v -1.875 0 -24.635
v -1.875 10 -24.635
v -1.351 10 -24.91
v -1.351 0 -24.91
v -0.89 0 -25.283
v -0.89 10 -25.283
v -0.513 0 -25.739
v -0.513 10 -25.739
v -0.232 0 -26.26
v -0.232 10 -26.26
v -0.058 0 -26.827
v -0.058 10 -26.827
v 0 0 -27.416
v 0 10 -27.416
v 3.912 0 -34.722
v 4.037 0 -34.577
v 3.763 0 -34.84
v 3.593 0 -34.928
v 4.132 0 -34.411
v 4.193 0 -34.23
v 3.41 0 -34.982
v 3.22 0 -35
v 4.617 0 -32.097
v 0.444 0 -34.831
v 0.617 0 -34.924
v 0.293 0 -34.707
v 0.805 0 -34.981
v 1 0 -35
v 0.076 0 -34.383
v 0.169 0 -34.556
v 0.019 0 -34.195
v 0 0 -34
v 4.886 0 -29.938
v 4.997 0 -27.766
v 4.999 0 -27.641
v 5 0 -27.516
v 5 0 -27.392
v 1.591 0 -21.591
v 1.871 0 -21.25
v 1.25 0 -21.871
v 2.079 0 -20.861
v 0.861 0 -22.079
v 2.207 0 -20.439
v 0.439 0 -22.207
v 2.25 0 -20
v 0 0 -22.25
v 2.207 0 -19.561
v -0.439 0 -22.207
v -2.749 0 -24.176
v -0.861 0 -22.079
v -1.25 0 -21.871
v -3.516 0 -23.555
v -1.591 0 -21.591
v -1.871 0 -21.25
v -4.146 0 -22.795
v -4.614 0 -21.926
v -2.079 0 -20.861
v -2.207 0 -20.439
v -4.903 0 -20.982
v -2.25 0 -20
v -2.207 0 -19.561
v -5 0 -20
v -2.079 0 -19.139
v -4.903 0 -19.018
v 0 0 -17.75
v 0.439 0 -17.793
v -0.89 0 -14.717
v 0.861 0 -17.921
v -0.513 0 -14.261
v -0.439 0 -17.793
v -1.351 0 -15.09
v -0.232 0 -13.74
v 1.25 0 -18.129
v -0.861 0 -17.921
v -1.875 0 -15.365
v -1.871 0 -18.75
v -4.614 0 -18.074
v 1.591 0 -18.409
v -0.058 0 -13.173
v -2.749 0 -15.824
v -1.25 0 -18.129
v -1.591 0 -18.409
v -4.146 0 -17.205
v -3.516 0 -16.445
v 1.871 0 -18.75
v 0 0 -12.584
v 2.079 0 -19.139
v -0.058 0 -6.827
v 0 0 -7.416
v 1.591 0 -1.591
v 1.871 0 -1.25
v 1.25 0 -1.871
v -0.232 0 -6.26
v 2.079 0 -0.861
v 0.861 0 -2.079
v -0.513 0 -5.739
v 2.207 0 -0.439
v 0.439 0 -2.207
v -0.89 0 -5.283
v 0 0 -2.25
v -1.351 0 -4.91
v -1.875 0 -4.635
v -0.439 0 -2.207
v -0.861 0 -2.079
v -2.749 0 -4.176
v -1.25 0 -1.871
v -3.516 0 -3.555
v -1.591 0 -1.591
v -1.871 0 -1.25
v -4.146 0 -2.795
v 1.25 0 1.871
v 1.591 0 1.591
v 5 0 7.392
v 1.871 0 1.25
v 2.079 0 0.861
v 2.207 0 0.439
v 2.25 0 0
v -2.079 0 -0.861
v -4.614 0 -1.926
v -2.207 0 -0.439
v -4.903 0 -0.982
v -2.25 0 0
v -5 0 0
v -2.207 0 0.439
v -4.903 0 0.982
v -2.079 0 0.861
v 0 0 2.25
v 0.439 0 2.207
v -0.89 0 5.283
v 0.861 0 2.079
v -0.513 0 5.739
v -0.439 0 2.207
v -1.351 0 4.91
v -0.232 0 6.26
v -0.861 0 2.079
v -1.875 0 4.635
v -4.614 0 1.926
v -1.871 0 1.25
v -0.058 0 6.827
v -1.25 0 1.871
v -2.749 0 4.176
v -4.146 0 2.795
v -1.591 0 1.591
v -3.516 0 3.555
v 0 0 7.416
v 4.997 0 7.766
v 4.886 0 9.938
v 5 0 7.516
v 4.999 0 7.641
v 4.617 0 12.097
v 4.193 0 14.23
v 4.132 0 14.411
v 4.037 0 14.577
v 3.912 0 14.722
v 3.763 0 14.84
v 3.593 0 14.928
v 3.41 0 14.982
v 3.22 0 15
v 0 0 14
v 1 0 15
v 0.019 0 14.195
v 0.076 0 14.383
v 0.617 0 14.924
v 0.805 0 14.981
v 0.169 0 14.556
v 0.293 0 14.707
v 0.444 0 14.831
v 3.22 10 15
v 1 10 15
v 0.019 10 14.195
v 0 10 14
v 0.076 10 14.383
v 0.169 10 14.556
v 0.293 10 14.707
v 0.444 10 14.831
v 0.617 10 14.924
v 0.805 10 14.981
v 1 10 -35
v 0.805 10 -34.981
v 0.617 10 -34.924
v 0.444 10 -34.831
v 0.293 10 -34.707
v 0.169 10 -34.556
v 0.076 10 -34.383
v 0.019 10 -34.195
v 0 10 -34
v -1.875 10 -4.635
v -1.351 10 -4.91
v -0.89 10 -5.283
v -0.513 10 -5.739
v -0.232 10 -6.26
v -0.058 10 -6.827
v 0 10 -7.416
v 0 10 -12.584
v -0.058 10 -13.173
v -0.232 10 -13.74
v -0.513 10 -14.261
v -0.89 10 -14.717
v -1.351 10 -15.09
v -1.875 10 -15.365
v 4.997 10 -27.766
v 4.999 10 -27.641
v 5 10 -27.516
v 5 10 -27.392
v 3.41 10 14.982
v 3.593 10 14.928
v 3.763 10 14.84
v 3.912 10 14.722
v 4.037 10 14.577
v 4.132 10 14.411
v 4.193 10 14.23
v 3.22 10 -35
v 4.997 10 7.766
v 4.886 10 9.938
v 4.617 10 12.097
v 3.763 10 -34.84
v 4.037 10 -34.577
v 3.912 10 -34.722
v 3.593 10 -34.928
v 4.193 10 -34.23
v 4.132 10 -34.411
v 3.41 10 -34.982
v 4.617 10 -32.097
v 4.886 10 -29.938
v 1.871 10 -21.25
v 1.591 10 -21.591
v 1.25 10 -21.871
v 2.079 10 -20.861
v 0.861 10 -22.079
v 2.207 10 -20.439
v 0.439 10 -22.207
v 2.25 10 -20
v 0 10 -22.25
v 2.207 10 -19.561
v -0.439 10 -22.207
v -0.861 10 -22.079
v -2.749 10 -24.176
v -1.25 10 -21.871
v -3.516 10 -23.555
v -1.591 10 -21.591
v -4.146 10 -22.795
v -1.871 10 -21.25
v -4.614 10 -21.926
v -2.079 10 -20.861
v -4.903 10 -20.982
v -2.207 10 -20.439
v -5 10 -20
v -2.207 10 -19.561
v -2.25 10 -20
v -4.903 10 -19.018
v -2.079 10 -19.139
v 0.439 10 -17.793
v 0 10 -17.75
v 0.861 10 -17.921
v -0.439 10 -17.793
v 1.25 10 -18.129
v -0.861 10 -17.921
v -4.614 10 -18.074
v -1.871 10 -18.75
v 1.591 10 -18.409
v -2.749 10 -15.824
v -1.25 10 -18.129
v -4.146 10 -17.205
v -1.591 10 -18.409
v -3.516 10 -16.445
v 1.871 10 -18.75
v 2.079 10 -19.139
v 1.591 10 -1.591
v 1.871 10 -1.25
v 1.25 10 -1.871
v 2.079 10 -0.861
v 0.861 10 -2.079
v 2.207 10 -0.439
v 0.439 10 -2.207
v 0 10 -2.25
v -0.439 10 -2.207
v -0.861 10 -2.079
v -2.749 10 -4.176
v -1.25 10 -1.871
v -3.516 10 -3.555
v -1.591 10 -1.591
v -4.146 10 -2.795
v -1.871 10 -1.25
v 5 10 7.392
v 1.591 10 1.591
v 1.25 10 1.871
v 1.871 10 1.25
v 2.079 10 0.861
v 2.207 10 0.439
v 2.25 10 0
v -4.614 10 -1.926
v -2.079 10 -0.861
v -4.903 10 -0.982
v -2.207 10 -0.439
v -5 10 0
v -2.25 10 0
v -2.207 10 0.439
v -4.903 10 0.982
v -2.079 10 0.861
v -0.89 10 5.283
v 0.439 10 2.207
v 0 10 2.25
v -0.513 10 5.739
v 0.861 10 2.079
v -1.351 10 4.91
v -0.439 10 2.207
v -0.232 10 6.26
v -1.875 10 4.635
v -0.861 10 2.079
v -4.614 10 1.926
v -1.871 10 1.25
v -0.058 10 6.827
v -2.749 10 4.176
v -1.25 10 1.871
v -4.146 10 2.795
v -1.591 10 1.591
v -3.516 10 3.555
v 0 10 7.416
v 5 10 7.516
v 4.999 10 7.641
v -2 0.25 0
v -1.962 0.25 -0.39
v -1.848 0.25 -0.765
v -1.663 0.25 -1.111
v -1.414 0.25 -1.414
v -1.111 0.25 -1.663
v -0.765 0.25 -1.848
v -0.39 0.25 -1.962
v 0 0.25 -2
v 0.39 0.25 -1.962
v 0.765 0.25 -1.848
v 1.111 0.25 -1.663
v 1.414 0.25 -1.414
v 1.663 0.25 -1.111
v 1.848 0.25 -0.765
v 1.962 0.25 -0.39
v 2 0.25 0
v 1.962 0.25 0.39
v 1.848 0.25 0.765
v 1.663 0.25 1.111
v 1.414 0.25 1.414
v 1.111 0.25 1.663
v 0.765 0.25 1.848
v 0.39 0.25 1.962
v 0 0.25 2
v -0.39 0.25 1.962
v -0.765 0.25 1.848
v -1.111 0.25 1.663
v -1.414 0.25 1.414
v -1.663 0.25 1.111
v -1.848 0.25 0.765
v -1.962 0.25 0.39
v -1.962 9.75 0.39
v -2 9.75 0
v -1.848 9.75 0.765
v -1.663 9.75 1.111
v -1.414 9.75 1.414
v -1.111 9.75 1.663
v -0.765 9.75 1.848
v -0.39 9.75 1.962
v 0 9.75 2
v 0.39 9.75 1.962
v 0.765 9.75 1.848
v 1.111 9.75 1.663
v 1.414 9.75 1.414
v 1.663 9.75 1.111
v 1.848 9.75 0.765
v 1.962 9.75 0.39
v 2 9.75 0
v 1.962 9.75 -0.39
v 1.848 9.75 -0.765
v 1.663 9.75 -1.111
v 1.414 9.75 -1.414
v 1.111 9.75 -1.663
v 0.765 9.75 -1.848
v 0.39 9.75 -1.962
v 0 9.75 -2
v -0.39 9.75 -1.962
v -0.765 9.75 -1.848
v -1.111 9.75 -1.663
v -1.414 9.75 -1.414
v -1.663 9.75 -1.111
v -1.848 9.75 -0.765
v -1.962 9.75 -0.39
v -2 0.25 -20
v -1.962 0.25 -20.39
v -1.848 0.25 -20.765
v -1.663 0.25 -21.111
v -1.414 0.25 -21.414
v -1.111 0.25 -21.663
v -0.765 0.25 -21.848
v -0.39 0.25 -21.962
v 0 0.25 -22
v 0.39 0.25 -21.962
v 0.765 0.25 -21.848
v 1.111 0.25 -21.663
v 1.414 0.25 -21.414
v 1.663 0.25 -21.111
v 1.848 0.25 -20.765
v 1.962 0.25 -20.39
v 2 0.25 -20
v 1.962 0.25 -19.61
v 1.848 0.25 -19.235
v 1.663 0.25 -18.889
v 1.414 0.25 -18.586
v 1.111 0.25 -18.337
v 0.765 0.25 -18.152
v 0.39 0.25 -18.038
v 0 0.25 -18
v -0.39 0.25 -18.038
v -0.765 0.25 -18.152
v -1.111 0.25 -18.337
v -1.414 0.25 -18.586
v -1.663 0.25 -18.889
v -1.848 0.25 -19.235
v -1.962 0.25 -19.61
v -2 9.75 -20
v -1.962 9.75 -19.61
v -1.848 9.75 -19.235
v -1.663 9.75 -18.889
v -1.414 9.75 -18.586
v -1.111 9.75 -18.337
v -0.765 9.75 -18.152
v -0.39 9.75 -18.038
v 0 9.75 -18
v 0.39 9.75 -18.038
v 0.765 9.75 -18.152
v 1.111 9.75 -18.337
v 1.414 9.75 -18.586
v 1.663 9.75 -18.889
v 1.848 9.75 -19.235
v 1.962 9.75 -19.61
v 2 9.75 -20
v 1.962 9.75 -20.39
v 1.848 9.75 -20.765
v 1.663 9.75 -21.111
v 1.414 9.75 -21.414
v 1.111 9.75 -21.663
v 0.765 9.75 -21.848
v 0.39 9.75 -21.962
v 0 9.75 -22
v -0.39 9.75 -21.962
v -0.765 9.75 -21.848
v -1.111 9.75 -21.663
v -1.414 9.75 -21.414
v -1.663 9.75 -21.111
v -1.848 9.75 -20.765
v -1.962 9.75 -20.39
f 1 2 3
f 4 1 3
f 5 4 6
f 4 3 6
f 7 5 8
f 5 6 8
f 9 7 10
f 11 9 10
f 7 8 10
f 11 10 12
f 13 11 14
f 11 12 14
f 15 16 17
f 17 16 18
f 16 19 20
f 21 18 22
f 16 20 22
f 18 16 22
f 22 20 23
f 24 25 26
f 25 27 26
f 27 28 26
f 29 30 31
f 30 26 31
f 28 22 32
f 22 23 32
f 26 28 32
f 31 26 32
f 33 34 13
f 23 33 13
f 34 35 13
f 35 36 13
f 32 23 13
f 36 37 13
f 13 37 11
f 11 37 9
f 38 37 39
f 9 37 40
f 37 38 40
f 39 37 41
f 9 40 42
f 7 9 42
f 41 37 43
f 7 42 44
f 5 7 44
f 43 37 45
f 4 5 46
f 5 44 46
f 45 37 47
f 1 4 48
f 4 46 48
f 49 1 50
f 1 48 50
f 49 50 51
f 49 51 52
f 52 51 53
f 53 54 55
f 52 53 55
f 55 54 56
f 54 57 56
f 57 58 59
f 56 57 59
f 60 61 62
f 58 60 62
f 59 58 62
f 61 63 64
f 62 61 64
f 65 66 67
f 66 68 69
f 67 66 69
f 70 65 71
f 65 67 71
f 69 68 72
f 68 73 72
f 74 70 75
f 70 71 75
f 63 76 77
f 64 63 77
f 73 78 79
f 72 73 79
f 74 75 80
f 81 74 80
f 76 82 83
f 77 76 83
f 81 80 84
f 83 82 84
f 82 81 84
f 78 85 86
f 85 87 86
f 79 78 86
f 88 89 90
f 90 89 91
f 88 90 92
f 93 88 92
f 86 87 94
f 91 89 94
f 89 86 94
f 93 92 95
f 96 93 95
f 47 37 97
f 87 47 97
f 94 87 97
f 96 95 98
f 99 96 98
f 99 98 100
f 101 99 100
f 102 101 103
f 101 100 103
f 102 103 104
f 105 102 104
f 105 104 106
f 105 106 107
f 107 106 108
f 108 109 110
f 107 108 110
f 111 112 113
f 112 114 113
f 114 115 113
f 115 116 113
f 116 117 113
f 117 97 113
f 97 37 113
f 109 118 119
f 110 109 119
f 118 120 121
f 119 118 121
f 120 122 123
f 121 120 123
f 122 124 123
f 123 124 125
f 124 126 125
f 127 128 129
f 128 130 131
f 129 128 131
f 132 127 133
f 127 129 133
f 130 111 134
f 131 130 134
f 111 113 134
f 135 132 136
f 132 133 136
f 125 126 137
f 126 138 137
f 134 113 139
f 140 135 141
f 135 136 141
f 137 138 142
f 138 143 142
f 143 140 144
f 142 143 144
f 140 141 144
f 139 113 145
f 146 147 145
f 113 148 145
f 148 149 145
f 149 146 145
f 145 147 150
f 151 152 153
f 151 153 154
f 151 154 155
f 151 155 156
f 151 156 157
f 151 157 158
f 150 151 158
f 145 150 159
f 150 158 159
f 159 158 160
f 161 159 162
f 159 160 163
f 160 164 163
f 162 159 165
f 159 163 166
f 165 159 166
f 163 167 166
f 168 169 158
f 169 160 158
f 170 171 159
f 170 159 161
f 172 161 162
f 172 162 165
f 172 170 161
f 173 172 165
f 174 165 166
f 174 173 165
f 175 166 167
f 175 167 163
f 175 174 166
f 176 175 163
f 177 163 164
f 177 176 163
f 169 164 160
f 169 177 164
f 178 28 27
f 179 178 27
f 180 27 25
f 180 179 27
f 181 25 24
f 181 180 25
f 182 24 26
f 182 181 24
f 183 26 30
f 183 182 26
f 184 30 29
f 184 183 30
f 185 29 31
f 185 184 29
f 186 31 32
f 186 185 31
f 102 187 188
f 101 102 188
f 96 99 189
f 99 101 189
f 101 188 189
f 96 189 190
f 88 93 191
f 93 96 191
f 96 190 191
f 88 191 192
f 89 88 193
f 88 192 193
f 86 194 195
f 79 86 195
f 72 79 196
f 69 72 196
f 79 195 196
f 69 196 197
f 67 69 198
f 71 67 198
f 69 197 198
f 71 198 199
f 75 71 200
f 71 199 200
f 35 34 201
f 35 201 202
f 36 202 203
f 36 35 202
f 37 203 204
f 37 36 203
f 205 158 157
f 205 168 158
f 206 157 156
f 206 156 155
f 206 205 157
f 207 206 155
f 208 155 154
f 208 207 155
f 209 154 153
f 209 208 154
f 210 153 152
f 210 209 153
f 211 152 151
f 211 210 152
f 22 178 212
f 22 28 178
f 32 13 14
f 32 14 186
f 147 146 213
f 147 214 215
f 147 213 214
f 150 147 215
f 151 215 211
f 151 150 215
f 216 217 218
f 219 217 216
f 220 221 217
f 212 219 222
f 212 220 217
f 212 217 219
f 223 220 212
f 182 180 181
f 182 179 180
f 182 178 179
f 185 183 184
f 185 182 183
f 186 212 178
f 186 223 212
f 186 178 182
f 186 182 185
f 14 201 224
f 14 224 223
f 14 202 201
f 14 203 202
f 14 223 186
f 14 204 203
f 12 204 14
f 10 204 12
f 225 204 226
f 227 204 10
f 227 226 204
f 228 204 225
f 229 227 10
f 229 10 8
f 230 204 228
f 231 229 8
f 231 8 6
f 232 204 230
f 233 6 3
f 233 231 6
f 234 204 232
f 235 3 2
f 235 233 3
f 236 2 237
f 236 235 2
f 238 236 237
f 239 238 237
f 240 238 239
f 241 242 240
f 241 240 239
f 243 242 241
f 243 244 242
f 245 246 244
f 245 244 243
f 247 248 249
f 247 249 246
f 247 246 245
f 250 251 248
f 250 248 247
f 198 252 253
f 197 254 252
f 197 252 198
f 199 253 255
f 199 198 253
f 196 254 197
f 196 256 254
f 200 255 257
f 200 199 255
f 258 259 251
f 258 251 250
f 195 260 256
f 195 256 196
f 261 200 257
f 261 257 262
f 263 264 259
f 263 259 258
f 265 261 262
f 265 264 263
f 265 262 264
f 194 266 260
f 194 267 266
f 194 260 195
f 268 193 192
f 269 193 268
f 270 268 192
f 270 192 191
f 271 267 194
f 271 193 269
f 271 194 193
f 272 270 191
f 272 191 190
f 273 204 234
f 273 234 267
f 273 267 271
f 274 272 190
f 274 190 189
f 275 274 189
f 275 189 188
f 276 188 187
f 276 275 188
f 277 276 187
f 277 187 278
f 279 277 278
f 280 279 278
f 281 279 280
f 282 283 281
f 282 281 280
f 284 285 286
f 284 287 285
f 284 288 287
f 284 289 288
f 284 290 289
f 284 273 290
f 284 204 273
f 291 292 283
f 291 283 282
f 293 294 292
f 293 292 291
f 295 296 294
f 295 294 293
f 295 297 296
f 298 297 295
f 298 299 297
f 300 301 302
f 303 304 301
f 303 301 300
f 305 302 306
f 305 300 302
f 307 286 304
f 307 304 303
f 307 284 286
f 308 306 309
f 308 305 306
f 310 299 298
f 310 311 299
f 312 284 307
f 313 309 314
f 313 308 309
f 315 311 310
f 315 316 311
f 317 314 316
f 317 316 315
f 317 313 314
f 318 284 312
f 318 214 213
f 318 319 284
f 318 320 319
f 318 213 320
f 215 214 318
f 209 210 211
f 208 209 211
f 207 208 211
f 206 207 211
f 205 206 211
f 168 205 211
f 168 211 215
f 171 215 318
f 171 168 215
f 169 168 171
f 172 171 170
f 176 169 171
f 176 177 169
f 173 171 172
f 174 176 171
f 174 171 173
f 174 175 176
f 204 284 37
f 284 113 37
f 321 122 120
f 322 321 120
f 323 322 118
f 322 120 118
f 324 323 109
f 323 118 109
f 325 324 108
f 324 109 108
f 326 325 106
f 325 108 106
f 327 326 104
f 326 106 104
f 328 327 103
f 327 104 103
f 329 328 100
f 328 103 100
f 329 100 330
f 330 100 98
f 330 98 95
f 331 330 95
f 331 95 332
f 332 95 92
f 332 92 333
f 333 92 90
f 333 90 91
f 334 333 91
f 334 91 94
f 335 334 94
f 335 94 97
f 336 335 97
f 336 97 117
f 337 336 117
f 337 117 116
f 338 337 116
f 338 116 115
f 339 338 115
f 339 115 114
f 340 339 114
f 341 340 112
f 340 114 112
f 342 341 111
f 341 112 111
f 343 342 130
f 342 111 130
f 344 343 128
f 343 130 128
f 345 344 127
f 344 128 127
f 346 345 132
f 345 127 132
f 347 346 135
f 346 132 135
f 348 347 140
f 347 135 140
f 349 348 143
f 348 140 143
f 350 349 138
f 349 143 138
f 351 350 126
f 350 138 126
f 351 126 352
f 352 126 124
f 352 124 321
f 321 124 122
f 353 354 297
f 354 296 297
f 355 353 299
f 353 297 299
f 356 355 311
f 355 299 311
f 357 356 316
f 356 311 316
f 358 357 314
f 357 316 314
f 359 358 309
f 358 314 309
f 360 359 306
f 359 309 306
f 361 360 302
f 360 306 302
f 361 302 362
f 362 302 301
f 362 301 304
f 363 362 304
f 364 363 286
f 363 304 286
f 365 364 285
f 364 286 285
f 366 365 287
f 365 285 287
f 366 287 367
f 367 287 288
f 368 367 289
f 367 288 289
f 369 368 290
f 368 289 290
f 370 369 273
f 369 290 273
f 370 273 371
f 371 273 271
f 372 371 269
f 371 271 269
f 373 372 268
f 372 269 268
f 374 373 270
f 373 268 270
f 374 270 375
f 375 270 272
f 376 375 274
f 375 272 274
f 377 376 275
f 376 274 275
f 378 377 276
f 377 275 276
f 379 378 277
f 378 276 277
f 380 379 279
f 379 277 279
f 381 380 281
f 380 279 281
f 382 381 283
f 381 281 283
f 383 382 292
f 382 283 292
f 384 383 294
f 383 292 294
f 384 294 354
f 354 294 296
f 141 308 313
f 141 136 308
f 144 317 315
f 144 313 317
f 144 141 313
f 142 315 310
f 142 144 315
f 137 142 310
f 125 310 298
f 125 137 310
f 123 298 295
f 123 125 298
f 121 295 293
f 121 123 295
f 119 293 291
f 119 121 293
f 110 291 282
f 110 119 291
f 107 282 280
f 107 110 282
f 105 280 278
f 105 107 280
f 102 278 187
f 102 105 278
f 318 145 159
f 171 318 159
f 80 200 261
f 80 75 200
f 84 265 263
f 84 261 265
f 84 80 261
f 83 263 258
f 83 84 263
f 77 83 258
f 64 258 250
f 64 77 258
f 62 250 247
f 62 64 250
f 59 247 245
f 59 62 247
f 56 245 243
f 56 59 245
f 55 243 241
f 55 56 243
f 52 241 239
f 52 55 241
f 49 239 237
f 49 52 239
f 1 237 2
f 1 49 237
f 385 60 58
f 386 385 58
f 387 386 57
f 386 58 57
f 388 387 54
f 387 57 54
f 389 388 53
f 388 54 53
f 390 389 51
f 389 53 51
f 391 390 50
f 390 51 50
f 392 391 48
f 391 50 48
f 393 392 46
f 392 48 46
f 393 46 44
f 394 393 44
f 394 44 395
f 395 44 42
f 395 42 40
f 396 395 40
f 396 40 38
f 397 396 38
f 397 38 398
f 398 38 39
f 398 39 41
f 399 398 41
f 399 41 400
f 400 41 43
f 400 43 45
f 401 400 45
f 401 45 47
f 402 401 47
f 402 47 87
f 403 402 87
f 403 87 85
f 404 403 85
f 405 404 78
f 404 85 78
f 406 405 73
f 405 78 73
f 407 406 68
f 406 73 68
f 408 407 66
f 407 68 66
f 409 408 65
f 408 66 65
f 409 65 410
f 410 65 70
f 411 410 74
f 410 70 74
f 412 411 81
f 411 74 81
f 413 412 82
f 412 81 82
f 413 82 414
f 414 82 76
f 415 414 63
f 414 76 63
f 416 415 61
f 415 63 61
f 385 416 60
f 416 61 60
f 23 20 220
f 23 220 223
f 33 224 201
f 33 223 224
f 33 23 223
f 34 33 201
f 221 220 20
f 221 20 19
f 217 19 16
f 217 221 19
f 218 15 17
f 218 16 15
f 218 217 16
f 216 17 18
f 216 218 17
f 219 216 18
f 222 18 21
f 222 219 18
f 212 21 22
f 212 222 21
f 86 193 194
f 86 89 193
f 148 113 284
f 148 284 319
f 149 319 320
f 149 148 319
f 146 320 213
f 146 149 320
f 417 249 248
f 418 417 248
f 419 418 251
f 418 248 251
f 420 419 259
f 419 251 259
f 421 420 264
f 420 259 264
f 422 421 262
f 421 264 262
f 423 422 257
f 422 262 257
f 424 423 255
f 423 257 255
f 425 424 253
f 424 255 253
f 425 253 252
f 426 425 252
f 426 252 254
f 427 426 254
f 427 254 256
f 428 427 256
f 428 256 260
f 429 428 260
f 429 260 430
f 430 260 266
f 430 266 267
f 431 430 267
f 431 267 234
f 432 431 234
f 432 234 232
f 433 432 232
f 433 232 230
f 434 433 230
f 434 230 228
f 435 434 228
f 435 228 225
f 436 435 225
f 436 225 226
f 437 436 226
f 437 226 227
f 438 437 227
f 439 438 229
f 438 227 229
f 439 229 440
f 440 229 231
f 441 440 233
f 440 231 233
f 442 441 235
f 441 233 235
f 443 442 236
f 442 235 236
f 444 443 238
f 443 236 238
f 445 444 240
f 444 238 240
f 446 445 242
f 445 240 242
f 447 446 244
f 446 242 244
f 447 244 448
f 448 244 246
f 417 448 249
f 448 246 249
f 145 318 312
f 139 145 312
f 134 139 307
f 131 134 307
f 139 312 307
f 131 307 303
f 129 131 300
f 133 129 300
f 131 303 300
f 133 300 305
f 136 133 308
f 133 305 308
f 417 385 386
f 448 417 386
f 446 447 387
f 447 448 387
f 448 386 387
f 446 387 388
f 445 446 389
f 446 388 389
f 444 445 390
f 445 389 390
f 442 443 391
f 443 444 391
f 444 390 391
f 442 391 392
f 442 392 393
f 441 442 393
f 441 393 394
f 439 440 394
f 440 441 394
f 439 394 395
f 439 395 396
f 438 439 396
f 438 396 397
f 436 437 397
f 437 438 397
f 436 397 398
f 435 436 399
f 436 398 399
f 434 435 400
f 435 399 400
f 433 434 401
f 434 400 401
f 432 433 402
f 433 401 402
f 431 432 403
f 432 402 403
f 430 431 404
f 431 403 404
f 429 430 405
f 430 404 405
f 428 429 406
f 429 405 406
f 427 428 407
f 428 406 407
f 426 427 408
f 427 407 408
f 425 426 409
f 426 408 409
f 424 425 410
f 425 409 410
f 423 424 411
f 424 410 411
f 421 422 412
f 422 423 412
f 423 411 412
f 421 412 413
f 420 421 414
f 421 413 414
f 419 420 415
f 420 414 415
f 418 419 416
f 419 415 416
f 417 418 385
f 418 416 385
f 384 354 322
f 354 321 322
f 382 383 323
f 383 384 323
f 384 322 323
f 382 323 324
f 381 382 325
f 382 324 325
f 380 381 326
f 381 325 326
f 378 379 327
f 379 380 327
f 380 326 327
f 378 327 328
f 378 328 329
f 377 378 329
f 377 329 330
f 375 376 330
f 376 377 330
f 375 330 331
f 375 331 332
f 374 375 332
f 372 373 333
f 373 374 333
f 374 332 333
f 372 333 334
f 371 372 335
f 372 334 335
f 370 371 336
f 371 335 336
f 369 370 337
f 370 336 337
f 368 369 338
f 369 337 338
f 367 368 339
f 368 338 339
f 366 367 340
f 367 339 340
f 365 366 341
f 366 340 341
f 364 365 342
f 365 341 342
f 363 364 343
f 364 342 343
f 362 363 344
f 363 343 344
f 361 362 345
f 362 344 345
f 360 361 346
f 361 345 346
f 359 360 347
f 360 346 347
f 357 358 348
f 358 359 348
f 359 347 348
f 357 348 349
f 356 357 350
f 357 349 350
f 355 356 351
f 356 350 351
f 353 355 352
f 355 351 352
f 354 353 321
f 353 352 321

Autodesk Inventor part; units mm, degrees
ref_plane "YZ Plane" through (0, 0, 0) normal (1, 0, 0) x (0, 1, 0)
ref_plane "XZ Plane" through (0, 0, 0) normal (0, 1, 0) x (-1, 0, 0)
ref_plane "XY Plane" through (0, 0, 0) normal (0, 0, 1) x (1, 0, 0)
sketch "Sketch1" plane through (0, 0, 0) normal (0, 1, 0) x (-1, 0, 0)
  circle A0 centre (0, 0) radius 2
  line L0 (0, 0) -> (0, -20) construction
  circle A1 centre (0, -20) radius 2
  arc A2 (0, -5) -> (0, 5) centre (0, 0) ccw
  arc A3 (0, -25) -> (0, -15) centre (0, -20) ccw
  line L1 (0, -5) -> (0, -15)
  line L2 (0, -10) -> (-5, -10) construction
  line L3 (-5, -10) -> (-5, -35) construction
  line L4 (-5, -10) -> (-5, 15) construction
  line L5 (0, 5) -> (0, 15)
  line L6 (0, 15) -> (-4, 15)
  line L7 (0, -25) -> (0, -35)
  line L8 (0, -35) -> (-4, -35)
  line L9 (-5, -10) -> (-5, 7.5)
  line L10 (-5, -10) -> (-5, -27.5)
  arc A4 (-4, 15) -> (-5, 7.5) centre (24.9994, 7.3167) ccw
  arc A5 (-5, -27.5) -> (-4, -35) centre (24.9994, -27.3167) ccw
  dimension "d0" = 4
  dimension "d1" = 20
  dimension "d2" = 4
  dimension "d3" = 10
  dimension "d4" = 10
  dimension "d5" = 5
  dimension "d6" = 25
  dimension "d7" = 25
  dimension "d8" = 10
  dimension "d9" = 4
  dimension "d10" = 10
  dimension "d11" = 4
  dimension "d12" = 17.5
  dimension "d13" = 17.5
  dimension "d14" = 30
  dimension "d15" = 30
extrude "Extrusion1" add sketch "Sketch1" along normal blind 10
fillet "Fillet1" radius 3 4 edges at (0, 5, 5) (0, 5, -5) (0, 5, -15) (0, 5, -25)
fillet "Fillet2" radius 1 4 edges at (0, 5, 15) (4, 5, 15) (0, 5, -35) (4, 5, -35)
fillet "Fillet3" radius 25 2 edges at (5, 5, 7.5) (5, 5, -27.5)
chamfer "Chamfer1" distance 0.25 angle 45 4 edges at (2, 10, -20) (2, 10, 0) (2, 0, 0) (2, 0, -20)
properties part number "Battery_Slide" material "Nylon 6/6"
